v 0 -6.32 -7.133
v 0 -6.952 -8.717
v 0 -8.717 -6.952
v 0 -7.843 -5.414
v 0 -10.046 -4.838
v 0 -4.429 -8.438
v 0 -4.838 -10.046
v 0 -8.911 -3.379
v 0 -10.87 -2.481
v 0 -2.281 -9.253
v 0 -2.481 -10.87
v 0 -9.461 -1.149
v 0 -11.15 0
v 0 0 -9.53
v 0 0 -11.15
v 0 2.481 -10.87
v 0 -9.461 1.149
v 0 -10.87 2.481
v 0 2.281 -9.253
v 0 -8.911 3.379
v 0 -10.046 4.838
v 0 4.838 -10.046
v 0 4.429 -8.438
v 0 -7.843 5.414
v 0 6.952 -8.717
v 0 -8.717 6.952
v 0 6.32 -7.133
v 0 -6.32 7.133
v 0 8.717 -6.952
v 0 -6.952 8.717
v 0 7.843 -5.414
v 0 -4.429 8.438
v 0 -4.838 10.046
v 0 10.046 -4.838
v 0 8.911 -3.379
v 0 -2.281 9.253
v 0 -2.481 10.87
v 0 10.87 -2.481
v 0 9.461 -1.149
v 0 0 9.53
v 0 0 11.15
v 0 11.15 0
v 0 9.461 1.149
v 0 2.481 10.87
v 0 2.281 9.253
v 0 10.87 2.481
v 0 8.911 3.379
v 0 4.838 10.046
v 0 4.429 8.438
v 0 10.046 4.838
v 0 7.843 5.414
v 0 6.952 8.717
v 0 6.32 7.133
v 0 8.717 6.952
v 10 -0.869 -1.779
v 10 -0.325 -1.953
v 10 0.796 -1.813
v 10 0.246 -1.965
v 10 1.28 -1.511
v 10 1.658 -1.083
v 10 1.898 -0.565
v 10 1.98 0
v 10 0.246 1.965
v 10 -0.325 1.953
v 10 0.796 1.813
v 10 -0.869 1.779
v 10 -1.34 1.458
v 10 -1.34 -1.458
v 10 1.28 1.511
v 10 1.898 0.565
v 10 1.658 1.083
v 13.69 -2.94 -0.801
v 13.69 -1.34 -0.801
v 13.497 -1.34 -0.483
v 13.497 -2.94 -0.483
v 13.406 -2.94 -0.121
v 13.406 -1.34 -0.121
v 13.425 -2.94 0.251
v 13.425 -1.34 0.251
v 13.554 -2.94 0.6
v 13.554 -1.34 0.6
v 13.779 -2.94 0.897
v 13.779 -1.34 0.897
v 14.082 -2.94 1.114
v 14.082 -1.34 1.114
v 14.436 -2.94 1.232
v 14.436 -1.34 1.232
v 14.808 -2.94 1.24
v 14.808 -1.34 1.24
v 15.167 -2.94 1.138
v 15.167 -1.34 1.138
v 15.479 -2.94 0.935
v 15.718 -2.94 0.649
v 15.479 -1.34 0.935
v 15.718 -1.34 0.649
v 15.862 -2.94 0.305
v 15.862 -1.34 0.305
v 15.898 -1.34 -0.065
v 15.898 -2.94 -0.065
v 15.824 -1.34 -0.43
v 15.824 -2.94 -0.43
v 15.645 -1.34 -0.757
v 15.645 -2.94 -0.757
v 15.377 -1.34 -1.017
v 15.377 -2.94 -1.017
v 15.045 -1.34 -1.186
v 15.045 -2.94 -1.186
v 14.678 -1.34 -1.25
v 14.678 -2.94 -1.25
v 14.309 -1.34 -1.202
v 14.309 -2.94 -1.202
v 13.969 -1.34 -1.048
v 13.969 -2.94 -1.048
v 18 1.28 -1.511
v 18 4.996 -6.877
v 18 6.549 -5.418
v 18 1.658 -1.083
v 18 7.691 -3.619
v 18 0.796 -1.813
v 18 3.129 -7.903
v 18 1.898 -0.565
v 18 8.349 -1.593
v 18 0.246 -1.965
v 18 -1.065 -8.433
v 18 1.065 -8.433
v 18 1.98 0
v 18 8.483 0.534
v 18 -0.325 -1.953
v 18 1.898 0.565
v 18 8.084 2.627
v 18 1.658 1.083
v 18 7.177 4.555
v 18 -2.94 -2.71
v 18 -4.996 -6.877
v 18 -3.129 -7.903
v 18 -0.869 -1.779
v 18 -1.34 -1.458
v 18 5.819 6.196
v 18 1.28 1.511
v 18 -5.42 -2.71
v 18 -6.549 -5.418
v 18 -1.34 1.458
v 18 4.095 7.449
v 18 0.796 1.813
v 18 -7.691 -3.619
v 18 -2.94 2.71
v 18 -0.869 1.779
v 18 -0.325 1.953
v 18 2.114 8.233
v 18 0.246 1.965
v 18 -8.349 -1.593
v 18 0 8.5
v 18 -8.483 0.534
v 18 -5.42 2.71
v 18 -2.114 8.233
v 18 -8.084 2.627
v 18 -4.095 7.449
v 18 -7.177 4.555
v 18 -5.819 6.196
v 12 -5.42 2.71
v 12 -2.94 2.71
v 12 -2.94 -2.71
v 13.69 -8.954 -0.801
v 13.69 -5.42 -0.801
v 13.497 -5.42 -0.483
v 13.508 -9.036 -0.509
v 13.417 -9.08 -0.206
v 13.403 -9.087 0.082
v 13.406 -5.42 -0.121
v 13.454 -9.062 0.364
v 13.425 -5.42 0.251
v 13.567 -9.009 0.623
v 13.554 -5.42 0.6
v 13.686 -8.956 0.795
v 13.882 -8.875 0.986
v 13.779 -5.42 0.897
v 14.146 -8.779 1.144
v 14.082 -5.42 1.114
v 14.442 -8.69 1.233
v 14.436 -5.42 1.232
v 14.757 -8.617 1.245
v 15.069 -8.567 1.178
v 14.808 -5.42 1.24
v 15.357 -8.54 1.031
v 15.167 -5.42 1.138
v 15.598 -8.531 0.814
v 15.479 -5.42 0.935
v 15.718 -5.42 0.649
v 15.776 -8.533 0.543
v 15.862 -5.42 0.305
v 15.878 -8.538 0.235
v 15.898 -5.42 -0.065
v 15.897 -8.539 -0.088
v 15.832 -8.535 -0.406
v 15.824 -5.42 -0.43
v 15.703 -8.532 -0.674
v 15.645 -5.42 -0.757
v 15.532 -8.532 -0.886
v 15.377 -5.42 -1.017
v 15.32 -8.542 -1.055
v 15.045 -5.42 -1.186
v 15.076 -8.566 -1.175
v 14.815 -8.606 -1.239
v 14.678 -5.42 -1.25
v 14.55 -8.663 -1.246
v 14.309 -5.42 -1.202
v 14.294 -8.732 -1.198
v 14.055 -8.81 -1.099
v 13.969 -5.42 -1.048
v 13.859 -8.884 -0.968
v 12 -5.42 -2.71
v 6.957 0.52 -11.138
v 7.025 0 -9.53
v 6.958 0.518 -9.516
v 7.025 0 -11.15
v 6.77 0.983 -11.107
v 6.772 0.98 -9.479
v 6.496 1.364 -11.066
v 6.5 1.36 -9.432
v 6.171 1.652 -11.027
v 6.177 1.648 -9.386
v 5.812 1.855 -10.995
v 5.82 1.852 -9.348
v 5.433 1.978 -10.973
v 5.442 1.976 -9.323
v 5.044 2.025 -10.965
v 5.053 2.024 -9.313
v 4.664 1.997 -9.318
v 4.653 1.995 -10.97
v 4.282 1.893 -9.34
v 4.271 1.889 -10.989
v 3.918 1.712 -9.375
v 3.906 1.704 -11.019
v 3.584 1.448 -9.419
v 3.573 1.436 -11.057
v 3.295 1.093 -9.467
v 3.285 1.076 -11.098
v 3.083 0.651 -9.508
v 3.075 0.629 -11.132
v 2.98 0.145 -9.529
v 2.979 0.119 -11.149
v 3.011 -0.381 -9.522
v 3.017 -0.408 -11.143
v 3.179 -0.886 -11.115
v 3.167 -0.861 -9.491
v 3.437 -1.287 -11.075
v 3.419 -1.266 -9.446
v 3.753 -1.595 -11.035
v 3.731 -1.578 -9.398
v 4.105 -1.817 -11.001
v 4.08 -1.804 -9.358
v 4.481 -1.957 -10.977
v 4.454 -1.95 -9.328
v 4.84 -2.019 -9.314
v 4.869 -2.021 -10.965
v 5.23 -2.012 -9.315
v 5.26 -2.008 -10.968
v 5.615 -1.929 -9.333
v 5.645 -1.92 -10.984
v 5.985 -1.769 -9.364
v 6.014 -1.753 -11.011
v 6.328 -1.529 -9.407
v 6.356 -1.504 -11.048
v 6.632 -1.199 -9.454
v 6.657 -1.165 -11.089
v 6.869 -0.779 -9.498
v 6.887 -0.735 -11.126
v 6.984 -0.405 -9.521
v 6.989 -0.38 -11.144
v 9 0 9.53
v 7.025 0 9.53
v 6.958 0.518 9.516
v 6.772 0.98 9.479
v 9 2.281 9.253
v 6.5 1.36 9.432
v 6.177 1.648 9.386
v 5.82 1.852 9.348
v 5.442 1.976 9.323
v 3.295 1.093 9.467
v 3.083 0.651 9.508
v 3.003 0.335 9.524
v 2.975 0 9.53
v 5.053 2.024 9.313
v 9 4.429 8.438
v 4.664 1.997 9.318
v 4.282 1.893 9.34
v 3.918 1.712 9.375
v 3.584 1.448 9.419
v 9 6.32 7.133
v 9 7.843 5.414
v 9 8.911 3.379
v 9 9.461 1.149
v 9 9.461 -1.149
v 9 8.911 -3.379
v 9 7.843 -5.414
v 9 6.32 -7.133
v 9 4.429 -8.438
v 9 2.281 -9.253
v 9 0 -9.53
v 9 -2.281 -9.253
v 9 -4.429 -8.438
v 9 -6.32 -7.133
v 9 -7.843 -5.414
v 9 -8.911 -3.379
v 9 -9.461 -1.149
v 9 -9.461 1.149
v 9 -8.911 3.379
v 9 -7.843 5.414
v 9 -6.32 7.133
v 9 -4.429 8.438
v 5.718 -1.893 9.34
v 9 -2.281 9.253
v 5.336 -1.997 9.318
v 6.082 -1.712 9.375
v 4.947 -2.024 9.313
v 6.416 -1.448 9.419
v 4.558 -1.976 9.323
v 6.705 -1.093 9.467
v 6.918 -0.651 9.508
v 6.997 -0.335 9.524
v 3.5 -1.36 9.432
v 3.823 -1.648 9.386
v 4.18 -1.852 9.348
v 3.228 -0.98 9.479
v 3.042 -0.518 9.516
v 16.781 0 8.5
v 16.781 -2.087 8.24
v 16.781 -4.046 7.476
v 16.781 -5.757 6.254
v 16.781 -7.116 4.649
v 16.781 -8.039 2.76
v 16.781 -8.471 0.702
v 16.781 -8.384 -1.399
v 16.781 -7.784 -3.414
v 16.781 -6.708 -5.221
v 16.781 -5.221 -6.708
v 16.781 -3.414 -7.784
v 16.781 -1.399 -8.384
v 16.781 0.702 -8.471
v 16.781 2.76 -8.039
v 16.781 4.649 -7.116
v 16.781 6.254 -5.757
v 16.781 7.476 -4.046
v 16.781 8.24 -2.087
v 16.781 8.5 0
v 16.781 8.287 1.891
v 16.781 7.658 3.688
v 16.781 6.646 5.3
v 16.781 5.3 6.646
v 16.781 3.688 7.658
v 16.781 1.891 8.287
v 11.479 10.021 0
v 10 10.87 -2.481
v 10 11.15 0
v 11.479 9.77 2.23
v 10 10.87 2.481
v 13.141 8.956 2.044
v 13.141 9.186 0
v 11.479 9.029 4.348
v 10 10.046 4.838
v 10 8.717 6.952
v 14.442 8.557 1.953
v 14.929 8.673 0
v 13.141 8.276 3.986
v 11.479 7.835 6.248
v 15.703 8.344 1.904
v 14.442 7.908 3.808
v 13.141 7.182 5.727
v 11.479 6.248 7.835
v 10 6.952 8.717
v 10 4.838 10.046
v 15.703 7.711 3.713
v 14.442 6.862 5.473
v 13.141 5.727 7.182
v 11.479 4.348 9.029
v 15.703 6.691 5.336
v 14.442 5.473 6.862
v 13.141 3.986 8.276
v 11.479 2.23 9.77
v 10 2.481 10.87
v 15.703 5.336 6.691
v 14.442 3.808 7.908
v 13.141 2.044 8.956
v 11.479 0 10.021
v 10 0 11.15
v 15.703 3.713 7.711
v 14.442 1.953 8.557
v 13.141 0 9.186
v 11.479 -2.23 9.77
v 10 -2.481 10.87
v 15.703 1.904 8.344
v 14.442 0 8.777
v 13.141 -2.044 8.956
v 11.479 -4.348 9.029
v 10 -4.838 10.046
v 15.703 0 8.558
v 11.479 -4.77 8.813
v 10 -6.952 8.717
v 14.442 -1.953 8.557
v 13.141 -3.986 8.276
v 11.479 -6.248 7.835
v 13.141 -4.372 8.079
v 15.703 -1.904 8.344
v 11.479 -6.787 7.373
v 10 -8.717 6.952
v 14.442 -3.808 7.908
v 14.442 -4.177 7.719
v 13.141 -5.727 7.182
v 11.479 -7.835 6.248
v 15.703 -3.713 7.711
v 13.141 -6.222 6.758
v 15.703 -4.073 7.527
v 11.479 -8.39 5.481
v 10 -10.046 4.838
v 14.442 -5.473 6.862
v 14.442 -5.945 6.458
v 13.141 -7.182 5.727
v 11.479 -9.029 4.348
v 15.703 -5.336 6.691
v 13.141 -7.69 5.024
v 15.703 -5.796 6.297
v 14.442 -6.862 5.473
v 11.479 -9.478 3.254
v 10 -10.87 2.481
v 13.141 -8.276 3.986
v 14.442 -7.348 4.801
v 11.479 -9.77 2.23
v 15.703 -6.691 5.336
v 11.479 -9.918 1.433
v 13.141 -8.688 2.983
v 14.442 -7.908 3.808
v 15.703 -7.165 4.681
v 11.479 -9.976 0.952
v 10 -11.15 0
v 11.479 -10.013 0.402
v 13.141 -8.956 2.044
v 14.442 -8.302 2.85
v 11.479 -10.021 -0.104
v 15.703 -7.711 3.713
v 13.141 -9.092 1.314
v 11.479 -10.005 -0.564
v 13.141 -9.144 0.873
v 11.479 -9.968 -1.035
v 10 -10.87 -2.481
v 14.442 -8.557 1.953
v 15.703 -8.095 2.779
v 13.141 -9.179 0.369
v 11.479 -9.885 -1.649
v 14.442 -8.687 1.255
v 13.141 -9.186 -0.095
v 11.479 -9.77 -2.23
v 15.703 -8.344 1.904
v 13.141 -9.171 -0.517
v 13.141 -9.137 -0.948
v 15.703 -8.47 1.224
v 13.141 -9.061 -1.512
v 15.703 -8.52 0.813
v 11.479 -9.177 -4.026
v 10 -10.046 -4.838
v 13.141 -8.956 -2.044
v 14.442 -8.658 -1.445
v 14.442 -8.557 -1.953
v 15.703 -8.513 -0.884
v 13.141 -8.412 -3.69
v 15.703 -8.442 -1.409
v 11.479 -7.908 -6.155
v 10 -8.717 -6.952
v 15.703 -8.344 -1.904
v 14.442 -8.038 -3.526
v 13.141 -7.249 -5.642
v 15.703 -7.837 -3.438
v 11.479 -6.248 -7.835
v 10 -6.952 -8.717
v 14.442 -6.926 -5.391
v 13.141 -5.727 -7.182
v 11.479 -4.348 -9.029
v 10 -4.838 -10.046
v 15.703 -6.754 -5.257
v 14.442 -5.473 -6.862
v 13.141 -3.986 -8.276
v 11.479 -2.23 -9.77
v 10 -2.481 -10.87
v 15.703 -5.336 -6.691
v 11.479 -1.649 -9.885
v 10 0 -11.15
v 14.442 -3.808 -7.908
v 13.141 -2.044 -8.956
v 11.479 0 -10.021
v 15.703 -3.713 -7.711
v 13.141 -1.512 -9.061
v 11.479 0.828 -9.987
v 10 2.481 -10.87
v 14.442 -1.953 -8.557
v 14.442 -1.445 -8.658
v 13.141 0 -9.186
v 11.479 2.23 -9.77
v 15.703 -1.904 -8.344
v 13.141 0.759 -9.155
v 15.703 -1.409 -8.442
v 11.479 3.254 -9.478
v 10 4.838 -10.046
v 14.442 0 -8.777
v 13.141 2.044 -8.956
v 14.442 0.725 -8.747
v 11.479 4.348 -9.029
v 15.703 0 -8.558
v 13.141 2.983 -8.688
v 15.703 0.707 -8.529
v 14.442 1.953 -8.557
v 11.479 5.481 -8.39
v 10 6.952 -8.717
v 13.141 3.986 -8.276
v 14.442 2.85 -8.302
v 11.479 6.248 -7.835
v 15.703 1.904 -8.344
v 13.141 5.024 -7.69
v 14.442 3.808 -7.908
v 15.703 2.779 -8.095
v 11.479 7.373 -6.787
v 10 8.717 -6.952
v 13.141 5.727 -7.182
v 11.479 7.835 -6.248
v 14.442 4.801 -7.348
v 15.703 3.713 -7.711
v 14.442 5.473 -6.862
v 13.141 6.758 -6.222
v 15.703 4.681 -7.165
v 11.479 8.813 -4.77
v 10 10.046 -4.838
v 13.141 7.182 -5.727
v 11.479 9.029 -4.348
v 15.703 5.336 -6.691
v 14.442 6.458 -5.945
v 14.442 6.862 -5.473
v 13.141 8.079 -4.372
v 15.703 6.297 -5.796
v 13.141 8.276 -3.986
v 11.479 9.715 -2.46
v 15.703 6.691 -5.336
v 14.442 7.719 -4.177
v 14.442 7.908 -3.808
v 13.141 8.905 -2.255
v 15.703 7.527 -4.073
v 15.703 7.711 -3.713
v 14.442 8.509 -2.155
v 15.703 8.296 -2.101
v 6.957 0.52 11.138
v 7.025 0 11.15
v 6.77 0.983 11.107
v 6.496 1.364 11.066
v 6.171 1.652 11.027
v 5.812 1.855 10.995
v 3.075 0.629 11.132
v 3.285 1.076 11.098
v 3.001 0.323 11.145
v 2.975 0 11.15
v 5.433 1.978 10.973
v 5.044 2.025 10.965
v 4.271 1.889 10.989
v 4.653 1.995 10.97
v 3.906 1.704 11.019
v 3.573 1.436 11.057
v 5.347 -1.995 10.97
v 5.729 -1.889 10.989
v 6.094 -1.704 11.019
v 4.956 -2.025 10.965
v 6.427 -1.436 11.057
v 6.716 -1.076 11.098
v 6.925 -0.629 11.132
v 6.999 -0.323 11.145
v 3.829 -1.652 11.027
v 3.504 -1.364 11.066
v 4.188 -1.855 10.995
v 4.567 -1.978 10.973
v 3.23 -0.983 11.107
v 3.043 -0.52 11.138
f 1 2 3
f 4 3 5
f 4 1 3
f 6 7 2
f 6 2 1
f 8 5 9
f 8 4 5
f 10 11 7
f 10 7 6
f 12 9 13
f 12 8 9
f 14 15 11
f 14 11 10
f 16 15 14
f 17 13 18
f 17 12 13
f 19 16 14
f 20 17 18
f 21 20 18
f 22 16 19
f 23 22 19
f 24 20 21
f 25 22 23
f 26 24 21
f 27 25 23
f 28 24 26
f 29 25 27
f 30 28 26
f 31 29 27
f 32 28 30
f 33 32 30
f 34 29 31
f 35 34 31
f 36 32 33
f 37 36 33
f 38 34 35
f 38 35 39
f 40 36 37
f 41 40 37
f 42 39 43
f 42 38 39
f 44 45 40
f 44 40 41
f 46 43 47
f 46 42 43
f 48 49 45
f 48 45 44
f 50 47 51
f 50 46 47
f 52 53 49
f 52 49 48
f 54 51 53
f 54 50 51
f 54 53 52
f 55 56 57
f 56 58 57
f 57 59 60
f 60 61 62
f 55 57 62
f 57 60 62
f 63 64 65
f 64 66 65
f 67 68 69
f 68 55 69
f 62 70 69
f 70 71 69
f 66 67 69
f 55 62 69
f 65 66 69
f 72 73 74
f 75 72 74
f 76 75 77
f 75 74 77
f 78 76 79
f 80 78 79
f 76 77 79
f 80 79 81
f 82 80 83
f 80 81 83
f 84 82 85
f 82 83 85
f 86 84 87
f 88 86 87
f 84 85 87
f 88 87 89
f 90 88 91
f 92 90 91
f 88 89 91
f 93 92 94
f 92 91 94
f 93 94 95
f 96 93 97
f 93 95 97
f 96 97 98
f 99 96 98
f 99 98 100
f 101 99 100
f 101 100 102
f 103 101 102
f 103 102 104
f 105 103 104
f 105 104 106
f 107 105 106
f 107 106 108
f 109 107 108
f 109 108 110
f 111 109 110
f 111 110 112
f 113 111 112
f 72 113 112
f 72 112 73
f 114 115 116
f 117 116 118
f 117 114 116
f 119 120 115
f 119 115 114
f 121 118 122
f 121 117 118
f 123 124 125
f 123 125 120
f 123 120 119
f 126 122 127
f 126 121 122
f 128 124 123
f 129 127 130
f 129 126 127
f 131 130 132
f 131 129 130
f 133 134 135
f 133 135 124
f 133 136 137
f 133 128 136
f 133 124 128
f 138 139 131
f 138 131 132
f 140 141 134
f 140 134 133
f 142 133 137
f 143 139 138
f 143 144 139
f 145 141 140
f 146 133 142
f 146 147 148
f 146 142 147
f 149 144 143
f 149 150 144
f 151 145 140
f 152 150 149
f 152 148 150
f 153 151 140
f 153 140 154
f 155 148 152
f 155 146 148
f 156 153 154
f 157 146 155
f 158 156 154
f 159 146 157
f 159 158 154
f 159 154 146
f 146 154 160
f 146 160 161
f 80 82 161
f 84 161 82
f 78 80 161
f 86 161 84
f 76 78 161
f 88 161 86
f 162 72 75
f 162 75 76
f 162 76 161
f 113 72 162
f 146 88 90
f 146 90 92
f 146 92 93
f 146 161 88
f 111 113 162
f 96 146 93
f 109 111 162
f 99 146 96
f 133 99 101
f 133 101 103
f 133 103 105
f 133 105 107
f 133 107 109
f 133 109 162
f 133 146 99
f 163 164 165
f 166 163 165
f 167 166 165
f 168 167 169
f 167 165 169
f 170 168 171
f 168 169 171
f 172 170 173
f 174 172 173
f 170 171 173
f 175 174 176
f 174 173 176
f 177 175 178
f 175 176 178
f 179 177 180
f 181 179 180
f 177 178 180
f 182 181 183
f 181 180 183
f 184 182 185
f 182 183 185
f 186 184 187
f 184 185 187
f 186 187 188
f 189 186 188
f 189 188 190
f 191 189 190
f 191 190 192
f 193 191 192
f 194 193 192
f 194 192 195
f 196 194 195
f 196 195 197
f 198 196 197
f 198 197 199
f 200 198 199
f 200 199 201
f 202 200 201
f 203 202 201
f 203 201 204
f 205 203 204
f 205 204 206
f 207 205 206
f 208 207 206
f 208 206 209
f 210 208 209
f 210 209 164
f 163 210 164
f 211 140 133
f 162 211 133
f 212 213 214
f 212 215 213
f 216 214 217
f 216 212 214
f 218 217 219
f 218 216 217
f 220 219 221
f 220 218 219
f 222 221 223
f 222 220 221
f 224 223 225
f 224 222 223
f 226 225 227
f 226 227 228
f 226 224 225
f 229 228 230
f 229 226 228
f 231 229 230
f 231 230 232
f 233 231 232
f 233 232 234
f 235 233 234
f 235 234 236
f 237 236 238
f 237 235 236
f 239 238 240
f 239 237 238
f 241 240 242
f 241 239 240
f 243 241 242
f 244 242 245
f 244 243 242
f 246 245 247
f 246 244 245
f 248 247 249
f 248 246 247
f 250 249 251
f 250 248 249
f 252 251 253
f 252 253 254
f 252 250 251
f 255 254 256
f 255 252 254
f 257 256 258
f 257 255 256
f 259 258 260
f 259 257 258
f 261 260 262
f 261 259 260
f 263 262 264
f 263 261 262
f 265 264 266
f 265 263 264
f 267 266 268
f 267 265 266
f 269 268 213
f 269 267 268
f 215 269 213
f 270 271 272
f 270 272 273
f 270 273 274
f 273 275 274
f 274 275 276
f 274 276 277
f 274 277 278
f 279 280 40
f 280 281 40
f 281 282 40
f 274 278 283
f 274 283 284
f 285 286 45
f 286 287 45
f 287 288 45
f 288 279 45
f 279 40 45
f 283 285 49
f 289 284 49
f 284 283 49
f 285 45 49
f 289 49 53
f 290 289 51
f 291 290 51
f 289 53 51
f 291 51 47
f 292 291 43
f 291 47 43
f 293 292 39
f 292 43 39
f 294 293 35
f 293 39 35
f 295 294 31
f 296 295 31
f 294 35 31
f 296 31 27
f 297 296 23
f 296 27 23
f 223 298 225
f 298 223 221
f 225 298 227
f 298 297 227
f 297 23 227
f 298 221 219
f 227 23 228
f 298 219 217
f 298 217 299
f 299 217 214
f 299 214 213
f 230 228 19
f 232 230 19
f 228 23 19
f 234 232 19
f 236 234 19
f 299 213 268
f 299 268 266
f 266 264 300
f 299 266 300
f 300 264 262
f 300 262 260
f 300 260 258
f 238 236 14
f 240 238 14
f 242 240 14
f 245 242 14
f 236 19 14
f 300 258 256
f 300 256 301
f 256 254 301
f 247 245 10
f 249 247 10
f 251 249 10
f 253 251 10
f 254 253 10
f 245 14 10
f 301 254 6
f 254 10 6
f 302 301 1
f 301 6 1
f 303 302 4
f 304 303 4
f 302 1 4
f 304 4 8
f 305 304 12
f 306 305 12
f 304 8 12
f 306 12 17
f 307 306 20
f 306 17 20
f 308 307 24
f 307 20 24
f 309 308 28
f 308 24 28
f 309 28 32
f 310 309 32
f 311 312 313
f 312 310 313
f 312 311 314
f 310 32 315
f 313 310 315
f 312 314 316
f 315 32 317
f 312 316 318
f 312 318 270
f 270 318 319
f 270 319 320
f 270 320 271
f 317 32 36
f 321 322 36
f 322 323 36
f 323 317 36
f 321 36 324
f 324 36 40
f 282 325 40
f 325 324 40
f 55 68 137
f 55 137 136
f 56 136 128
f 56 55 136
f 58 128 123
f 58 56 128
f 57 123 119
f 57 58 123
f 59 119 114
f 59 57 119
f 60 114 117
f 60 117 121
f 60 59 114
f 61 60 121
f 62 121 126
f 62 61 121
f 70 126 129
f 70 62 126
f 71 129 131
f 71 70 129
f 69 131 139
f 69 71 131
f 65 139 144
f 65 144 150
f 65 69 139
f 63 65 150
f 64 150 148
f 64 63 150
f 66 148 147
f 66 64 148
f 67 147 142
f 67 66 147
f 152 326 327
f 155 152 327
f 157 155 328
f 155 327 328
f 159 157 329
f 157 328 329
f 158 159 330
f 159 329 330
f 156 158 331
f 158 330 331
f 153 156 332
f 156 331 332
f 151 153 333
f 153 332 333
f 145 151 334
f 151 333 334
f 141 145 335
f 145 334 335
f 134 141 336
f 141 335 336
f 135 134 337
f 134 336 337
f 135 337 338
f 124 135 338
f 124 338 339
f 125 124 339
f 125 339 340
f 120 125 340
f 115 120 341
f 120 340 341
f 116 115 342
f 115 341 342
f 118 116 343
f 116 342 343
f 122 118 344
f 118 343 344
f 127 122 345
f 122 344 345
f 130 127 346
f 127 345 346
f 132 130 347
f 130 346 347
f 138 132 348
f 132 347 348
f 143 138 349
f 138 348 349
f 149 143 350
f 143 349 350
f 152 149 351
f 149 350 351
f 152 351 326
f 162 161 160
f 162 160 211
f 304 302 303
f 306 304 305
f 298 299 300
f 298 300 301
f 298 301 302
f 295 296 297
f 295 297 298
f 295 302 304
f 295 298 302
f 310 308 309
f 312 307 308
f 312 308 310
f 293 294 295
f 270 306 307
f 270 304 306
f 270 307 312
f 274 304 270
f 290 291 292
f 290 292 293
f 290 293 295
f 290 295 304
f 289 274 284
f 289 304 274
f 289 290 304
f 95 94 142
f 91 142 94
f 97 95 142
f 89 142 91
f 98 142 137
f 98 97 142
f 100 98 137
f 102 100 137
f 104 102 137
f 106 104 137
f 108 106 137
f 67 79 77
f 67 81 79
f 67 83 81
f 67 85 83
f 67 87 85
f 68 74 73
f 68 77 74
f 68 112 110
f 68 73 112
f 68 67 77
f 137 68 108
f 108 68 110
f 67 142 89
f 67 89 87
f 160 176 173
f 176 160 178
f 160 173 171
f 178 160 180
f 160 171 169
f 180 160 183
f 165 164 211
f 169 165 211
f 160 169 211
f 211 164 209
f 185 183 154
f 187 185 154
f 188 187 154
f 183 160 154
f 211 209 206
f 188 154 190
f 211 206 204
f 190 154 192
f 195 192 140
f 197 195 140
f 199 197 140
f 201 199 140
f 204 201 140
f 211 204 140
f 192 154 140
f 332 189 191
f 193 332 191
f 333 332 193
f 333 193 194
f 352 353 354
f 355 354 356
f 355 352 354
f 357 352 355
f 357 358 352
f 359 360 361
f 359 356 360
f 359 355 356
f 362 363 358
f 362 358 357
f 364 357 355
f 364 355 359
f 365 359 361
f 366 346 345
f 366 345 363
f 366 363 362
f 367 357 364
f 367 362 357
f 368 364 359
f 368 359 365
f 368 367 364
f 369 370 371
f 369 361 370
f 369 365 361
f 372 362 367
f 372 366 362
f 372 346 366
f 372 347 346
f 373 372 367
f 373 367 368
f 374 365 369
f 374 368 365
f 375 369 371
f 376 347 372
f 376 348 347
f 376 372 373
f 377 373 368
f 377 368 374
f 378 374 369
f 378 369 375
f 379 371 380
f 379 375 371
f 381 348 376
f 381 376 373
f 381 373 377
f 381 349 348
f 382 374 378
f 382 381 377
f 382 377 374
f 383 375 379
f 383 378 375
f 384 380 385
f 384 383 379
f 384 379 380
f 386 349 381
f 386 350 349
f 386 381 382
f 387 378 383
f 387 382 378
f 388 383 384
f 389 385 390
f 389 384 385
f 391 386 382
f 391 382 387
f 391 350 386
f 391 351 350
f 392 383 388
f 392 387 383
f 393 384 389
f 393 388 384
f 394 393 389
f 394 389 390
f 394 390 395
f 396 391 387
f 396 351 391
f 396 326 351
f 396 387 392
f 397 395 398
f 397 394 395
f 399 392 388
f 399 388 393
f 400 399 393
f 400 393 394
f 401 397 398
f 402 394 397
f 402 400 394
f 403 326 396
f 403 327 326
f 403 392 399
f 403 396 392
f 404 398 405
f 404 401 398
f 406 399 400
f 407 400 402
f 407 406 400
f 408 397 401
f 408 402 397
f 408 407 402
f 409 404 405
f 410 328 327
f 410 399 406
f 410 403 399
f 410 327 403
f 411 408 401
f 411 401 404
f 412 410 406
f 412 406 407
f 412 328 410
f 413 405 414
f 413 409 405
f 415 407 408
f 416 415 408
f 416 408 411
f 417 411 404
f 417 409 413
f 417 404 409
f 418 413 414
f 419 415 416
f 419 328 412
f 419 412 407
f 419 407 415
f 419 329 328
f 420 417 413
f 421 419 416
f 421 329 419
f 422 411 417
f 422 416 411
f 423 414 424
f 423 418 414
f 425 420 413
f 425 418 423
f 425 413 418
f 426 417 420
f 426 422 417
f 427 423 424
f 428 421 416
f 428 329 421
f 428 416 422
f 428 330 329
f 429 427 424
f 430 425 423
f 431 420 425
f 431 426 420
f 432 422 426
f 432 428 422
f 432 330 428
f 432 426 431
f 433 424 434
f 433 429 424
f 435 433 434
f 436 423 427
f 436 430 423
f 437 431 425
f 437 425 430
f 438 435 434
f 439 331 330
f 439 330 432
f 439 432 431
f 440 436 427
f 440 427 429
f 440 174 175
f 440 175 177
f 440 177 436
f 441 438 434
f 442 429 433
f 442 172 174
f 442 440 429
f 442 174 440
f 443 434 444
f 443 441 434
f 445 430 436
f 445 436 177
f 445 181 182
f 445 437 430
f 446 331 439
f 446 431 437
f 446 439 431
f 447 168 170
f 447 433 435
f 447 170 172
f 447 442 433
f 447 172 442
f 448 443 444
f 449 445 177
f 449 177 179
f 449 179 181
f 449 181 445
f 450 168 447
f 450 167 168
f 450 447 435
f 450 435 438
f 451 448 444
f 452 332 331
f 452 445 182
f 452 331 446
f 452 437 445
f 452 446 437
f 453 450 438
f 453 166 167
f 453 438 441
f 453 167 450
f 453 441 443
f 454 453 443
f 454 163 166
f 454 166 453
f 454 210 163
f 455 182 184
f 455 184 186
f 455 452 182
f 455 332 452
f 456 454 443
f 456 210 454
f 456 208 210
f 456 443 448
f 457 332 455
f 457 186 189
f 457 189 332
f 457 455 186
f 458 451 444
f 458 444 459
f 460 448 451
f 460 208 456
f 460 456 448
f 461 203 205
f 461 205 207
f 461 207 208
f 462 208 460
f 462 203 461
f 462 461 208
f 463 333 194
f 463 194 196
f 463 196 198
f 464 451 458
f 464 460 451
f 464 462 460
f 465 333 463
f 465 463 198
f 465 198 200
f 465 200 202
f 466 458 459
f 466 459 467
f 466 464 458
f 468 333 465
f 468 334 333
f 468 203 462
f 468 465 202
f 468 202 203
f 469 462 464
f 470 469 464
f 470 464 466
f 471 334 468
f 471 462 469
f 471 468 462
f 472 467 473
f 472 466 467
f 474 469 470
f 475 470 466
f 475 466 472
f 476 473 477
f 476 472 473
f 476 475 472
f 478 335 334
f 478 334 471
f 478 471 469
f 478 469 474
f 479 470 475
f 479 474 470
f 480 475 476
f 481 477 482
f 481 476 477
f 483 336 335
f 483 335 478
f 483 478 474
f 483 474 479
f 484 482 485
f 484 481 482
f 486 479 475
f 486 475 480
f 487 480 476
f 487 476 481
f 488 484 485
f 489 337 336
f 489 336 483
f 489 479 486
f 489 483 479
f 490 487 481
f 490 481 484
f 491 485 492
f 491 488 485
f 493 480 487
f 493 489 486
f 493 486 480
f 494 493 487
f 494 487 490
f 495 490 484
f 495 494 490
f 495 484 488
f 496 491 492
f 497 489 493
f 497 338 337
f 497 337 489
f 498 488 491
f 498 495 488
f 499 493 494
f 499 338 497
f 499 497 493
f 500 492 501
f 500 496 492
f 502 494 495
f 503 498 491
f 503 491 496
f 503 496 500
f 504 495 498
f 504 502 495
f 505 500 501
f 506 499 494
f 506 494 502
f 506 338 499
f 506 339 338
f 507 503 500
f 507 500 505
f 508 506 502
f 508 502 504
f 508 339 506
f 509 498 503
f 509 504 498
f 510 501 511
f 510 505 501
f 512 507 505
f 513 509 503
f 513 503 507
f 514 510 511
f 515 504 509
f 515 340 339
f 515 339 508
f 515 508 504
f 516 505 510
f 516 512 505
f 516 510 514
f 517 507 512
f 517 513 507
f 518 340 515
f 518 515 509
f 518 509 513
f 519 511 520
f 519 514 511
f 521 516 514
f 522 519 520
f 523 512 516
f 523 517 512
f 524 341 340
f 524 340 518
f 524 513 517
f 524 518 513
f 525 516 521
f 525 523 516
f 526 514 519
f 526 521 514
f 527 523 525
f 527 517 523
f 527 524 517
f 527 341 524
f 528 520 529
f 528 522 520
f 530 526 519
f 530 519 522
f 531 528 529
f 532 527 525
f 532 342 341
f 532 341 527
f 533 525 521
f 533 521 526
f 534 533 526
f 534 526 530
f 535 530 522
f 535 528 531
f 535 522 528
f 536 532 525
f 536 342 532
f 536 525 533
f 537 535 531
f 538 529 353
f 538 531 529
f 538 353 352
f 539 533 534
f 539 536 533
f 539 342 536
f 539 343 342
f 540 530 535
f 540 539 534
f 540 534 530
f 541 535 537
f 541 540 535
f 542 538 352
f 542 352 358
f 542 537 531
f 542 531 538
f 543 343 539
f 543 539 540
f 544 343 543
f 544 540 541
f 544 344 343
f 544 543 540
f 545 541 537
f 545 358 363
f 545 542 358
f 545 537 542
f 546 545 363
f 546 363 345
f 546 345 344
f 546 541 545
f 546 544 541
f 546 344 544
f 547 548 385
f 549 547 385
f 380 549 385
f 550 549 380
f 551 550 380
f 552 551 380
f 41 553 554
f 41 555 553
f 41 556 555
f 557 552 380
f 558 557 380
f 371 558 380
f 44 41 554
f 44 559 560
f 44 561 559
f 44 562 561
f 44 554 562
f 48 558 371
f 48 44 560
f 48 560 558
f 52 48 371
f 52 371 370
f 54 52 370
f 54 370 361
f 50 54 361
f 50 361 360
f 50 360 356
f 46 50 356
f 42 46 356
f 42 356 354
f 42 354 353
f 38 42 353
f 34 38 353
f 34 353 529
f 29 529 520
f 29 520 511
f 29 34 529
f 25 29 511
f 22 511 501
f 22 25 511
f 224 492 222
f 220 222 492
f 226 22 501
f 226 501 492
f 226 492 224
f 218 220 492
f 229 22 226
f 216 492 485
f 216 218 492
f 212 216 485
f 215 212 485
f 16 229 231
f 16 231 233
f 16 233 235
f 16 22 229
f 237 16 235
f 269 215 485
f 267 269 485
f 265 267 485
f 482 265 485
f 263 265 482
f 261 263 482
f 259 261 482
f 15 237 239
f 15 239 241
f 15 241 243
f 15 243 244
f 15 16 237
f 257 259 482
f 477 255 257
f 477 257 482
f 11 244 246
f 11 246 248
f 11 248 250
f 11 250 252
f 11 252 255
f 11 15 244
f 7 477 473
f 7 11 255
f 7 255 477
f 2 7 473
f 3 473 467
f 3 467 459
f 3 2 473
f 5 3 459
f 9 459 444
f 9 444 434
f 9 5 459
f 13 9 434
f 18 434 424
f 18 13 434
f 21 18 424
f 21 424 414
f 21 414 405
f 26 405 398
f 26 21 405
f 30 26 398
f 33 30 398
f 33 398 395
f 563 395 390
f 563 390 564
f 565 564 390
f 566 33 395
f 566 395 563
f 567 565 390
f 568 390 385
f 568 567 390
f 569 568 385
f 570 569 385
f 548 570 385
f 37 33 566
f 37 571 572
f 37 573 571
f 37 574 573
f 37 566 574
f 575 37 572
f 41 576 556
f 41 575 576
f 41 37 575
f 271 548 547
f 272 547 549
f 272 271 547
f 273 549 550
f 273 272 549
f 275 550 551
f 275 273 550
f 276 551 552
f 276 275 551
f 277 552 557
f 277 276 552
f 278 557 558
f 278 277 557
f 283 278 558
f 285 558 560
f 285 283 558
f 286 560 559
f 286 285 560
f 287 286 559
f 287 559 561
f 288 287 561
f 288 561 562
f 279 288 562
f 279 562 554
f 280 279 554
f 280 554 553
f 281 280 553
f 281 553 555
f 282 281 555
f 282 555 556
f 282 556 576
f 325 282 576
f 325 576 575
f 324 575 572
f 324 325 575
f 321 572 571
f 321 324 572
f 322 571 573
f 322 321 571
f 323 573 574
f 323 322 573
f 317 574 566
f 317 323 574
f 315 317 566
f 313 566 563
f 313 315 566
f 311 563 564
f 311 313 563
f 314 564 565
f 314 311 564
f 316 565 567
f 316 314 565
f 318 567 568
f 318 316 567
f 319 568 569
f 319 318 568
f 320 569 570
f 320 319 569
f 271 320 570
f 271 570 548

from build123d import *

# Parameters (mm, degrees)
CROQUIS1_R                 = 8.5
SALIENTE_EXTRUIR1_DEPTH    = 15
CORTAR_EXTRUIR1_DEPTH      = 9
CROQUIS9_R                 = 11.15
SALIENTE_EXTRUIR5_DEPTH    = 10
CROQUIS3_R                 = 9.53
CORTAR_EXTRUIR2_DEPTH      = 9
CORTAR_EXTRUIR4_DEPTH      = 22.763386685
CORTAR_EXTRUIR4_DEPTH_BACK = 22.763386685
CROQUIS5_R                 = 2.025
CROQUIS7_R                 = 8.5
SALIENTE_EXTRUIR3_DEPTH    = 3
CROQUIS10_W                = 5.42
CROQUIS10_H                = 2.48
CORTAR_EXTRUIR5_DEPTH      = 6
CROQUIS12_R                = 1.25
CORTAR_EXTRUIR6_DEPTH      = 24.930002183


with BuildPart() as part:
    # Croquis1 → Saliente-Extruir1 (new body)
    with BuildSketch(Plane(origin=(0, 0, 0), x_dir=(0, 0, -1), z_dir=(1, 0, 0))):
        Circle(CROQUIS1_R)
    extrude(amount=SALIENTE_EXTRUIR1_DEPTH)

    # Croquis2 → Cortar-Extruir1 (cut)
    with BuildSketch(Plane(origin=(15, 0, 0), x_dir=(0, 0, -1), z_dir=(1, 0, 0))):
        with BuildLine():
            Line((-1.457669373, -1.34), (1.457669373, -1.34))
            ThreePointArc((1.457669373, -1.34), (0, 1.98), (-1.457669373, -1.34))
        make_face()
    extrude(amount=-CORTAR_EXTRUIR1_DEPTH, mode=Mode.SUBTRACT)

    # Croquis9 → Saliente-Extruir5 (add)
    with BuildSketch(Plane.ZY):
        Circle(CROQUIS9_R)
    extrude(amount=-SALIENTE_EXTRUIR5_DEPTH)

    # Croquis3 → Cortar-Extruir2 (cut)
    with BuildSketch(Plane.ZY):
        Circle(CROQUIS3_R)
    extrude(amount=-CORTAR_EXTRUIR2_DEPTH, mode=Mode.SUBTRACT)

    # Croquis5 → Cortar-Extruir4 (cut, two sides: drawn at the far end of the back side and taken through both)
    with BuildSketch(Plane.XY.offset(-CORTAR_EXTRUIR4_DEPTH_BACK)):
        with Locations((5, 0)):
            Circle(CROQUIS5_R)
    extrude(amount=CORTAR_EXTRUIR4_DEPTH + CORTAR_EXTRUIR4_DEPTH_BACK, mode=Mode.SUBTRACT)

    # Croquis7 → Saliente-Extruir3 (add)
    with BuildSketch(Plane(origin=(15, 0, 0), x_dir=(0, 0, -1), z_dir=(1, 0, 0))):
        with Locations(Location((0, 0, 0), (0, 0, 180))):
            Circle(CROQUIS7_R)
        with BuildLine():
            Line((-1.457669373, -1.34), (1.457669373, -1.34))
            ThreePointArc((1.457669373, -1.34), (0, 1.98), (-1.457669373, -1.34))
        make_face(mode=Mode.SUBTRACT)
    extrude(amount=SALIENTE_EXTRUIR3_DEPTH)

    # Redondeo1: read off the stored shape, not the designer's step
    # Redondeo1 outline → Redondeo1 (revolve)
    with BuildSketch(Plane.YX):
        with BuildLine():
            Line((8.5, 10), (11.15, 10))
            ThreePointArc((11.15, 10), (9.186031995, 13.140616114), (8.5, 16.780671058))
            Line((8.5, 16.780671058), (8.5, 10))
        make_face()
    revolve(axis=Axis((0, 0, 0), (1, 0, 0)))

    # Croquis10 → Cortar-Extruir5 (cut)
    with BuildSketch(Plane(origin=(18, 0, 0), x_dir=(0, 0, -1), z_dir=(1, 0, 0))):
        with Locations((0, -4.18)):
            Rectangle(CROQUIS10_W, CROQUIS10_H)
    extrude(amount=-CORTAR_EXTRUIR5_DEPTH, mode=Mode.SUBTRACT)

    # Croquis12 → Cortar-Extruir6 (cut, through all)
    with BuildSketch(Plane(origin=(0, 0, 0), x_dir=(1, 0, 0), z_dir=(0, 1, 0))):
        with Locations(Location((14.65, 0, 0), (0, 0, 140.139668223))):
            Circle(CROQUIS12_R)
    extrude(amount=-CORTAR_EXTRUIR6_DEPTH, mode=Mode.SUBTRACT)


solid = part.part
